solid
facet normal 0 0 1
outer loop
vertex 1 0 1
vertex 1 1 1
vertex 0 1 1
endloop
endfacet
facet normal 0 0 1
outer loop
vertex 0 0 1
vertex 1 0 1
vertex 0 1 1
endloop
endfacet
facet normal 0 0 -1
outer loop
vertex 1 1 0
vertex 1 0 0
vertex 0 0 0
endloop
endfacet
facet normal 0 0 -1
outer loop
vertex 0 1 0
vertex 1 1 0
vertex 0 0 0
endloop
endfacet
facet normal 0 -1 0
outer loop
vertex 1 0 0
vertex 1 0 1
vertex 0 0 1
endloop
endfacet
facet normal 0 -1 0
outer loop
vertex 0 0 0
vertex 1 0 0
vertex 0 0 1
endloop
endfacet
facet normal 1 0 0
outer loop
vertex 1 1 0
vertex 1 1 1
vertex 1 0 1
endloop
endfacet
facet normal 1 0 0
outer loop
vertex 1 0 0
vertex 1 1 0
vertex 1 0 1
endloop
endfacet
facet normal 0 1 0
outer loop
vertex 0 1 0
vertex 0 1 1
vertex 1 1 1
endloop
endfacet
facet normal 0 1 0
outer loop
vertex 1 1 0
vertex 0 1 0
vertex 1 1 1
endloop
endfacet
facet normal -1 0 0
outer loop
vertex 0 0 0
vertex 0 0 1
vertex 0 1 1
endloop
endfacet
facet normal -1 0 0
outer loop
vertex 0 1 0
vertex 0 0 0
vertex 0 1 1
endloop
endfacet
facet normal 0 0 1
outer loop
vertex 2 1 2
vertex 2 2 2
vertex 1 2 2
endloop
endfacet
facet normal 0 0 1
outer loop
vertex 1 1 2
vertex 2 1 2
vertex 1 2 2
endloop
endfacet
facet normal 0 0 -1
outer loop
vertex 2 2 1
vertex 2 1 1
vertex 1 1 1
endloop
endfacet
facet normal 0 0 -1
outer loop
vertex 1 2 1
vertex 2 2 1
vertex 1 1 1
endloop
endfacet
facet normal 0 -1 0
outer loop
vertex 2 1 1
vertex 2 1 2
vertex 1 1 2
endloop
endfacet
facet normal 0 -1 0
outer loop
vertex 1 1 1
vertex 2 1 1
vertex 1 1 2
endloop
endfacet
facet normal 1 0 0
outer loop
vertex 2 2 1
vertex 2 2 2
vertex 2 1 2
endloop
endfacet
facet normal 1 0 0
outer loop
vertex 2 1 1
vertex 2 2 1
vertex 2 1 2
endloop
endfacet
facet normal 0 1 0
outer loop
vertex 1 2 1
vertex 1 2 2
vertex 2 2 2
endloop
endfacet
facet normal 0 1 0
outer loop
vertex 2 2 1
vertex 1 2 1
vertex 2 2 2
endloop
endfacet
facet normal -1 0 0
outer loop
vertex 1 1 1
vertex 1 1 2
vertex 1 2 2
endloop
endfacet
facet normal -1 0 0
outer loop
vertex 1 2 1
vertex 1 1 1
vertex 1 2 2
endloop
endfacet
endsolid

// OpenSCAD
polyhedron(
  points=[
    [0, 0, 0],
    [1, 0, 0],
    [0, 1, 0],
    [1, 1, 0],
    [0, 0, 1],
    [1, 0, 1],
    [0, 1, 1],
    [1, 1, 1],
    [1, 1, 1],
    [2, 1, 1],
    [1, 2, 1],
    [2, 2, 1],
    [1, 1, 2],
    [2, 1, 2],
    [1, 2, 2],
    [2, 2, 2],
  ],
  faces=[
    [6,7,5],[6,5,4],
    [0,1,3],[0,3,2],
    [4,5,1],[4,1,0],
    [5,7,3],[5,3,1],
    [7,6,2],[7,2,3],
    [6,4,0],[6,0,2],
    [14,15,13],[14,13,12],
    [8,9,11],[8,11,10],
    [12,13,9],[12,9,8],
    [13,15,11],[13,11,9],
    [15,14,10],[15,10,11],
    [14,12,8],[14,8,10],
  ]);
